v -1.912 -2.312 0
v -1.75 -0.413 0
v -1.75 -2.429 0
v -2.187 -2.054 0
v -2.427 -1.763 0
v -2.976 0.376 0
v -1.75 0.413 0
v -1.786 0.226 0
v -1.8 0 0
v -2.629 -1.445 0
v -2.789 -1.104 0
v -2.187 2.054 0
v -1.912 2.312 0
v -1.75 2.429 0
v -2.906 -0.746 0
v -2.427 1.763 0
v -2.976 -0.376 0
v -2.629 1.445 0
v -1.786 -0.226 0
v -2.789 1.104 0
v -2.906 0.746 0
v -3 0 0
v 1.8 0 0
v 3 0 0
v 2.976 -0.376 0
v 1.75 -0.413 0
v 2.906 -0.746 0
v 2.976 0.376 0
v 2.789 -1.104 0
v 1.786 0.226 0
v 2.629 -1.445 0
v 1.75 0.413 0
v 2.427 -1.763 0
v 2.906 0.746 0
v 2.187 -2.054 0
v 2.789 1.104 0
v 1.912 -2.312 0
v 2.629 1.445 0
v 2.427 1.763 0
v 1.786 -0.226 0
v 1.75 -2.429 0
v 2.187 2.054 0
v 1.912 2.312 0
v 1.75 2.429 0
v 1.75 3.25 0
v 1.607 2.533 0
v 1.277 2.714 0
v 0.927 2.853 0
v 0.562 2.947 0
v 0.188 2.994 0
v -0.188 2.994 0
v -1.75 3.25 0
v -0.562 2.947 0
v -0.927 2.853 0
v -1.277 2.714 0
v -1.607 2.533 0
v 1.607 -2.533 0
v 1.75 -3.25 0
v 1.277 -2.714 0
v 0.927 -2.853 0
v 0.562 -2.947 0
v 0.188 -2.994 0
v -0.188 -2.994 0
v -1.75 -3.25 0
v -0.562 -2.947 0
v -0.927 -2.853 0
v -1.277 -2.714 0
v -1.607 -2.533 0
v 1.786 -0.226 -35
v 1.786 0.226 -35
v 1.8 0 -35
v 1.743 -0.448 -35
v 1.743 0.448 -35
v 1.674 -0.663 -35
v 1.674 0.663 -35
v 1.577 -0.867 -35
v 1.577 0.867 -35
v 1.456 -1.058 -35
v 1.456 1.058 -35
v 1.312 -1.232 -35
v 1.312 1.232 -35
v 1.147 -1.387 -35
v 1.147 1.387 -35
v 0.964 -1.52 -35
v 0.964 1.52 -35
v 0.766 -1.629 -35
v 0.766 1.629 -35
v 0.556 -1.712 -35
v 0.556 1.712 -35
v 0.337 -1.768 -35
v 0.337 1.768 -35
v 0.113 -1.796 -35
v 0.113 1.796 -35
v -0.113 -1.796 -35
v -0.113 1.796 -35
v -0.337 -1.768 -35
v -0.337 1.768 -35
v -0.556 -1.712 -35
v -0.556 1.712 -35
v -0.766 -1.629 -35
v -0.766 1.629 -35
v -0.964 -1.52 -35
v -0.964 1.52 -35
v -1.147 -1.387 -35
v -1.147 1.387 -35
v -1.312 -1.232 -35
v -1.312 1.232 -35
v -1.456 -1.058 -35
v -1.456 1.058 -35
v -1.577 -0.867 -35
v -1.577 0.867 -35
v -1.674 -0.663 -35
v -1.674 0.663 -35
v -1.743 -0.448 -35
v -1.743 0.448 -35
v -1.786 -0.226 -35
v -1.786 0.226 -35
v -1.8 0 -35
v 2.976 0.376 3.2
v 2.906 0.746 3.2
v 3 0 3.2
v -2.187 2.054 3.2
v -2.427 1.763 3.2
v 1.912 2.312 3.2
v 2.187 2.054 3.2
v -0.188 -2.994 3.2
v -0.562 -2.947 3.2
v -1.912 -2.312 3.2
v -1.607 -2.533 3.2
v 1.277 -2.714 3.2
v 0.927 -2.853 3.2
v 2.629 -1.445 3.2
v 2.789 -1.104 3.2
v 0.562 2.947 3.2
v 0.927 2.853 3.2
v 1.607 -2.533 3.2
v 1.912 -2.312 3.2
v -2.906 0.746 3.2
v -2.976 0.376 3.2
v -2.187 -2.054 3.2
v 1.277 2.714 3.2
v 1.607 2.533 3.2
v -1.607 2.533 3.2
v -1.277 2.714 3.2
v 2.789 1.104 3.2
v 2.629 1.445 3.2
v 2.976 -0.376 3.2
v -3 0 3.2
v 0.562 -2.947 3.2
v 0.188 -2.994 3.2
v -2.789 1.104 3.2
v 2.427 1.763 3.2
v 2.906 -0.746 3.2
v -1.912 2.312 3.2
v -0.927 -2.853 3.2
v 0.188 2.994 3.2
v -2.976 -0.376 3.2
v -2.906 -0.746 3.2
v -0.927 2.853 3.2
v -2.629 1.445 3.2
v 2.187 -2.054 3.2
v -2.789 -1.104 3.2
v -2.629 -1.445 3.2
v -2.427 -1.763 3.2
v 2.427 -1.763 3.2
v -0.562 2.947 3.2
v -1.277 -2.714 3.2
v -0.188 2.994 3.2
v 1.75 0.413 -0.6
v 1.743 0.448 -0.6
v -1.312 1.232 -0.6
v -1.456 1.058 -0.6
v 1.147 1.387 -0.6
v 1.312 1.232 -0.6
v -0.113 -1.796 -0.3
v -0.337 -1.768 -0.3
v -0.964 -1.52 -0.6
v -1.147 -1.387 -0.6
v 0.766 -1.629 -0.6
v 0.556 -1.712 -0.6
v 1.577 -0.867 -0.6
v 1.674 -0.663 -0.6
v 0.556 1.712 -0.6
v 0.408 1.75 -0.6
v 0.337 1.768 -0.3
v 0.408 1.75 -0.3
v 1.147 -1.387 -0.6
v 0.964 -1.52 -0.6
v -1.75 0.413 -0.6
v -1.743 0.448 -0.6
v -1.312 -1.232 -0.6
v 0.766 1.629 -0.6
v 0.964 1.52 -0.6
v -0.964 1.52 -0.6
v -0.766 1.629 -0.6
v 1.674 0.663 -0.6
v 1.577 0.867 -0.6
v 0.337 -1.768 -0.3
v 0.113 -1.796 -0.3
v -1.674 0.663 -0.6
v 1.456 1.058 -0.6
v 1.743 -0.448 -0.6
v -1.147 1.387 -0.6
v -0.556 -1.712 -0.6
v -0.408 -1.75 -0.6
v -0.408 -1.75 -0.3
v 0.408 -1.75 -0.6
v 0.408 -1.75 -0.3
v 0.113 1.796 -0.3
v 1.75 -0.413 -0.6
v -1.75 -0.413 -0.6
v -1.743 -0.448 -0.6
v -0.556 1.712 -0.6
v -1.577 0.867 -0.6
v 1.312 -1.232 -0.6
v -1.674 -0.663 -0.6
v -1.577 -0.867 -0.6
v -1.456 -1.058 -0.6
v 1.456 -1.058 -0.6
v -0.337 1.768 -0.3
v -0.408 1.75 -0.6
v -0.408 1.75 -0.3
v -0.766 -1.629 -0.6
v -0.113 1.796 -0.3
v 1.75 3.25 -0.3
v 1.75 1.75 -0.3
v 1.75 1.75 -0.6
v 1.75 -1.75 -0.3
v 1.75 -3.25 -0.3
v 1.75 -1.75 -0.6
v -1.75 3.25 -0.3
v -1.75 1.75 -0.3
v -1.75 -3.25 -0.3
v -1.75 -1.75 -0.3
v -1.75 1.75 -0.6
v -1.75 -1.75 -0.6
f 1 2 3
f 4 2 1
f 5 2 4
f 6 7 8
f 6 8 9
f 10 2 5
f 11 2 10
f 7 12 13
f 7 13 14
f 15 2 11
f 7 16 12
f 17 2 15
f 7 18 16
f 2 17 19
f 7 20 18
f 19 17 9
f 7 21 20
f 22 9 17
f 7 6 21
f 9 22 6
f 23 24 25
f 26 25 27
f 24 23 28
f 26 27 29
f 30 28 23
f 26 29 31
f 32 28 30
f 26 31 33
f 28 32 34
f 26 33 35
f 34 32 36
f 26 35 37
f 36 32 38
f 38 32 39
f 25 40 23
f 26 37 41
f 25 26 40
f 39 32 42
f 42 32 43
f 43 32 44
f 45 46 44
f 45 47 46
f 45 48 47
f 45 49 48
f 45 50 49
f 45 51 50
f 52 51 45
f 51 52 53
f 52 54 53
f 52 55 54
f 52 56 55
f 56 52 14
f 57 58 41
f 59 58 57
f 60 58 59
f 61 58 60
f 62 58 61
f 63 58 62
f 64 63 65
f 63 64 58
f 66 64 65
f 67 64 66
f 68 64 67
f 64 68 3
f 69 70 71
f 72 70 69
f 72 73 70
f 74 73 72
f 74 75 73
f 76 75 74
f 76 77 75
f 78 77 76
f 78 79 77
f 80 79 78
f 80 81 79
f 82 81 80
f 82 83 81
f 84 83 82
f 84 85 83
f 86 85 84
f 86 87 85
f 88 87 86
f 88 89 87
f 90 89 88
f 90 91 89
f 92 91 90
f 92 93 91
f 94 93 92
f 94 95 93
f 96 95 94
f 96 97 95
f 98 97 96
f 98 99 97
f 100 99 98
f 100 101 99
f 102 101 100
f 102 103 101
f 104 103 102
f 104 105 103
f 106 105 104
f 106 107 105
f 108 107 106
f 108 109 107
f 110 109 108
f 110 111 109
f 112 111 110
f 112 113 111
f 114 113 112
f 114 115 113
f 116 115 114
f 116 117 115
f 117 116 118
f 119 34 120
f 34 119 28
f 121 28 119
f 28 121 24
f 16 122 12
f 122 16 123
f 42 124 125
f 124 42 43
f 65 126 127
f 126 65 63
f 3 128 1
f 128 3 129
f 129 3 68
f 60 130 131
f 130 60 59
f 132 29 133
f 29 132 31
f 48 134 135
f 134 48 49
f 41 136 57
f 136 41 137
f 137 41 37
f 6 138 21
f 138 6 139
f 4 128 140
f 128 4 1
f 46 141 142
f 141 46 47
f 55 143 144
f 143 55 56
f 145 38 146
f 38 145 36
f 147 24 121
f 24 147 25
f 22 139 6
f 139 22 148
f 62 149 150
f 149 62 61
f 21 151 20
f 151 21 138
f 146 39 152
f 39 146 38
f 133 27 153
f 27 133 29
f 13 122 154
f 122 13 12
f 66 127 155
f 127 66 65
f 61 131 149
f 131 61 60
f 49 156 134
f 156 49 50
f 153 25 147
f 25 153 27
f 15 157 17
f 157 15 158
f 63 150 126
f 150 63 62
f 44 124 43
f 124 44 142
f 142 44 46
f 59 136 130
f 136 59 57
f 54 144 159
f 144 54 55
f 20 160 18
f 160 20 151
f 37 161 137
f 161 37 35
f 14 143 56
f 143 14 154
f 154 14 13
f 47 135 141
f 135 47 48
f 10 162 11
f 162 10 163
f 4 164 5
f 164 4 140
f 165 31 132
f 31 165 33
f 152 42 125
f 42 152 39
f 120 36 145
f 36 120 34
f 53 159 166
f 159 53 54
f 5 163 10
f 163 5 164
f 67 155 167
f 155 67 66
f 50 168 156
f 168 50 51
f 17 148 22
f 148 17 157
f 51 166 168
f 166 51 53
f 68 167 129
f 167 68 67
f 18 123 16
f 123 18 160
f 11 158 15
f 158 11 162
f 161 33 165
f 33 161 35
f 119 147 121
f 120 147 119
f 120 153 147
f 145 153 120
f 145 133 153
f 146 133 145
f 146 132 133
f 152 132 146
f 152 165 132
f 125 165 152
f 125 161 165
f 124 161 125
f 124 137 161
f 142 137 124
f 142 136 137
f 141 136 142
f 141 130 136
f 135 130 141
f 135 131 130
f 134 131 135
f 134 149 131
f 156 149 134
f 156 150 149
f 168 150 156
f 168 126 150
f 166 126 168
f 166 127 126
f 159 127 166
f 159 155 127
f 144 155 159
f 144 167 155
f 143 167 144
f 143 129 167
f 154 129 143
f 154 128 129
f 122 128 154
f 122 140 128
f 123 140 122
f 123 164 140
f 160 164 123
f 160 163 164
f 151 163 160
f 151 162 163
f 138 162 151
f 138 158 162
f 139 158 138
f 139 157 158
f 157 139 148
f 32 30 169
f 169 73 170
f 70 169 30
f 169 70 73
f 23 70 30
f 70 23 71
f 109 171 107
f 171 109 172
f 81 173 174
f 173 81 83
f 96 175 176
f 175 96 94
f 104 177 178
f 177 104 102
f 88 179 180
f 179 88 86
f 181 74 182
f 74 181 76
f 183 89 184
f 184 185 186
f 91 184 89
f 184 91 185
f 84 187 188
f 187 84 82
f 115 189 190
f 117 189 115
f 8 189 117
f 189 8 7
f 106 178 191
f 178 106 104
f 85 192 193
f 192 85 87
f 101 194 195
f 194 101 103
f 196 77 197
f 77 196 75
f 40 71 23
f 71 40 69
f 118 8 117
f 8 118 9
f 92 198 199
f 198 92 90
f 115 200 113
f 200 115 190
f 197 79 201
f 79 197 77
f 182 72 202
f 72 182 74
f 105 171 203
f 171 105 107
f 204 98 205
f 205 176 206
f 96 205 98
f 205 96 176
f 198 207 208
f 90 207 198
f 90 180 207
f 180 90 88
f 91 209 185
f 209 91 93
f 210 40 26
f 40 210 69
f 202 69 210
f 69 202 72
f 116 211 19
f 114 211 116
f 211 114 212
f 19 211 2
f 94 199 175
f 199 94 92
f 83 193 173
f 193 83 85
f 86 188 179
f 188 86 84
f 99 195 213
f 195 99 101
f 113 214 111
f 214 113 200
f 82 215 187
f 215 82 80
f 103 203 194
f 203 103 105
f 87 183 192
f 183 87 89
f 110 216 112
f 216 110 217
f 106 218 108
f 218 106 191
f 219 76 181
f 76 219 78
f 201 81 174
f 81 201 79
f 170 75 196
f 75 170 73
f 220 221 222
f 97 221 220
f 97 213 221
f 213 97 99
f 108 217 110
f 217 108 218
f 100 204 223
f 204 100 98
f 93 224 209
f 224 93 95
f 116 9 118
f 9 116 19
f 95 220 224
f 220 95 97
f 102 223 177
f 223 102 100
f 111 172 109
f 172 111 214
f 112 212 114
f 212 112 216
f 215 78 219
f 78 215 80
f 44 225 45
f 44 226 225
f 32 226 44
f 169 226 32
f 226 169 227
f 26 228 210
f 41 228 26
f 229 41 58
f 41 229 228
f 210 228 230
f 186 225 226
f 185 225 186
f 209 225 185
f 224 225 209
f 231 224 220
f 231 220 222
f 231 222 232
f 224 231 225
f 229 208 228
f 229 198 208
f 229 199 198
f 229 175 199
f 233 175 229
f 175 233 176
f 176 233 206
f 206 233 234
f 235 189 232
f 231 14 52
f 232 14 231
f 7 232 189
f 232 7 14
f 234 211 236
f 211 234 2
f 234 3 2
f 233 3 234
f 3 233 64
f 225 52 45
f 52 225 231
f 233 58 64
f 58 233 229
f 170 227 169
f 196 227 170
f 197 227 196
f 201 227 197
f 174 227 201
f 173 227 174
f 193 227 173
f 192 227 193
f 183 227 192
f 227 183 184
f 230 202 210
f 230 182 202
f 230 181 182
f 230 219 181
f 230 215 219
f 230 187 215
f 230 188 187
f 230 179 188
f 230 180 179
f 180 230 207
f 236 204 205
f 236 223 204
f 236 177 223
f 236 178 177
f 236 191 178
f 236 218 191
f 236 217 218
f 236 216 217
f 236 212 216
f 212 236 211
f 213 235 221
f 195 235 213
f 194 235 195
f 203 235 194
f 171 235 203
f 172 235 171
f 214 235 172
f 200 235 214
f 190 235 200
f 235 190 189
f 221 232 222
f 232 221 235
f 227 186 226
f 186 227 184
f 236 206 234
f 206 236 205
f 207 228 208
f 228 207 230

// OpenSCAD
$fn = 50;


difference() {
	union() {
		translate(v = [0, 0, 0]) {
			rotate(a = [0, 0, 0]) {
				difference() {
					union() {
						translate(v = [0, 0, -35.0000000000]) {
							cylinder(h = 35, r = 1.5000000000);
						}
						cylinder(h = 3.2000000000, r = 3.0000000000);
						translate(v = [0, 0, -35.0000000000]) {
							cylinder(h = 35, r = 1.8000000000);
						}
						translate(v = [-1.7500000000, -3.2500000000, -0.3000000000]) {
							cube(size = [3.5000000000, 6.5000000000, 0.3000000000]);
						}
						translate(v = [-1.7500000000, -1.7500000000, -0.6000000000]) {
							cube(size = [3.5000000000, 3.5000000000, 0.3000000000]);
						}
						translate(v = [0, 0, -35.0000000000]) {
							cylinder(h = 35, r = 1.5000000000);
						}
					}
					union();
				}
			}
		}
	}
	union();
}
